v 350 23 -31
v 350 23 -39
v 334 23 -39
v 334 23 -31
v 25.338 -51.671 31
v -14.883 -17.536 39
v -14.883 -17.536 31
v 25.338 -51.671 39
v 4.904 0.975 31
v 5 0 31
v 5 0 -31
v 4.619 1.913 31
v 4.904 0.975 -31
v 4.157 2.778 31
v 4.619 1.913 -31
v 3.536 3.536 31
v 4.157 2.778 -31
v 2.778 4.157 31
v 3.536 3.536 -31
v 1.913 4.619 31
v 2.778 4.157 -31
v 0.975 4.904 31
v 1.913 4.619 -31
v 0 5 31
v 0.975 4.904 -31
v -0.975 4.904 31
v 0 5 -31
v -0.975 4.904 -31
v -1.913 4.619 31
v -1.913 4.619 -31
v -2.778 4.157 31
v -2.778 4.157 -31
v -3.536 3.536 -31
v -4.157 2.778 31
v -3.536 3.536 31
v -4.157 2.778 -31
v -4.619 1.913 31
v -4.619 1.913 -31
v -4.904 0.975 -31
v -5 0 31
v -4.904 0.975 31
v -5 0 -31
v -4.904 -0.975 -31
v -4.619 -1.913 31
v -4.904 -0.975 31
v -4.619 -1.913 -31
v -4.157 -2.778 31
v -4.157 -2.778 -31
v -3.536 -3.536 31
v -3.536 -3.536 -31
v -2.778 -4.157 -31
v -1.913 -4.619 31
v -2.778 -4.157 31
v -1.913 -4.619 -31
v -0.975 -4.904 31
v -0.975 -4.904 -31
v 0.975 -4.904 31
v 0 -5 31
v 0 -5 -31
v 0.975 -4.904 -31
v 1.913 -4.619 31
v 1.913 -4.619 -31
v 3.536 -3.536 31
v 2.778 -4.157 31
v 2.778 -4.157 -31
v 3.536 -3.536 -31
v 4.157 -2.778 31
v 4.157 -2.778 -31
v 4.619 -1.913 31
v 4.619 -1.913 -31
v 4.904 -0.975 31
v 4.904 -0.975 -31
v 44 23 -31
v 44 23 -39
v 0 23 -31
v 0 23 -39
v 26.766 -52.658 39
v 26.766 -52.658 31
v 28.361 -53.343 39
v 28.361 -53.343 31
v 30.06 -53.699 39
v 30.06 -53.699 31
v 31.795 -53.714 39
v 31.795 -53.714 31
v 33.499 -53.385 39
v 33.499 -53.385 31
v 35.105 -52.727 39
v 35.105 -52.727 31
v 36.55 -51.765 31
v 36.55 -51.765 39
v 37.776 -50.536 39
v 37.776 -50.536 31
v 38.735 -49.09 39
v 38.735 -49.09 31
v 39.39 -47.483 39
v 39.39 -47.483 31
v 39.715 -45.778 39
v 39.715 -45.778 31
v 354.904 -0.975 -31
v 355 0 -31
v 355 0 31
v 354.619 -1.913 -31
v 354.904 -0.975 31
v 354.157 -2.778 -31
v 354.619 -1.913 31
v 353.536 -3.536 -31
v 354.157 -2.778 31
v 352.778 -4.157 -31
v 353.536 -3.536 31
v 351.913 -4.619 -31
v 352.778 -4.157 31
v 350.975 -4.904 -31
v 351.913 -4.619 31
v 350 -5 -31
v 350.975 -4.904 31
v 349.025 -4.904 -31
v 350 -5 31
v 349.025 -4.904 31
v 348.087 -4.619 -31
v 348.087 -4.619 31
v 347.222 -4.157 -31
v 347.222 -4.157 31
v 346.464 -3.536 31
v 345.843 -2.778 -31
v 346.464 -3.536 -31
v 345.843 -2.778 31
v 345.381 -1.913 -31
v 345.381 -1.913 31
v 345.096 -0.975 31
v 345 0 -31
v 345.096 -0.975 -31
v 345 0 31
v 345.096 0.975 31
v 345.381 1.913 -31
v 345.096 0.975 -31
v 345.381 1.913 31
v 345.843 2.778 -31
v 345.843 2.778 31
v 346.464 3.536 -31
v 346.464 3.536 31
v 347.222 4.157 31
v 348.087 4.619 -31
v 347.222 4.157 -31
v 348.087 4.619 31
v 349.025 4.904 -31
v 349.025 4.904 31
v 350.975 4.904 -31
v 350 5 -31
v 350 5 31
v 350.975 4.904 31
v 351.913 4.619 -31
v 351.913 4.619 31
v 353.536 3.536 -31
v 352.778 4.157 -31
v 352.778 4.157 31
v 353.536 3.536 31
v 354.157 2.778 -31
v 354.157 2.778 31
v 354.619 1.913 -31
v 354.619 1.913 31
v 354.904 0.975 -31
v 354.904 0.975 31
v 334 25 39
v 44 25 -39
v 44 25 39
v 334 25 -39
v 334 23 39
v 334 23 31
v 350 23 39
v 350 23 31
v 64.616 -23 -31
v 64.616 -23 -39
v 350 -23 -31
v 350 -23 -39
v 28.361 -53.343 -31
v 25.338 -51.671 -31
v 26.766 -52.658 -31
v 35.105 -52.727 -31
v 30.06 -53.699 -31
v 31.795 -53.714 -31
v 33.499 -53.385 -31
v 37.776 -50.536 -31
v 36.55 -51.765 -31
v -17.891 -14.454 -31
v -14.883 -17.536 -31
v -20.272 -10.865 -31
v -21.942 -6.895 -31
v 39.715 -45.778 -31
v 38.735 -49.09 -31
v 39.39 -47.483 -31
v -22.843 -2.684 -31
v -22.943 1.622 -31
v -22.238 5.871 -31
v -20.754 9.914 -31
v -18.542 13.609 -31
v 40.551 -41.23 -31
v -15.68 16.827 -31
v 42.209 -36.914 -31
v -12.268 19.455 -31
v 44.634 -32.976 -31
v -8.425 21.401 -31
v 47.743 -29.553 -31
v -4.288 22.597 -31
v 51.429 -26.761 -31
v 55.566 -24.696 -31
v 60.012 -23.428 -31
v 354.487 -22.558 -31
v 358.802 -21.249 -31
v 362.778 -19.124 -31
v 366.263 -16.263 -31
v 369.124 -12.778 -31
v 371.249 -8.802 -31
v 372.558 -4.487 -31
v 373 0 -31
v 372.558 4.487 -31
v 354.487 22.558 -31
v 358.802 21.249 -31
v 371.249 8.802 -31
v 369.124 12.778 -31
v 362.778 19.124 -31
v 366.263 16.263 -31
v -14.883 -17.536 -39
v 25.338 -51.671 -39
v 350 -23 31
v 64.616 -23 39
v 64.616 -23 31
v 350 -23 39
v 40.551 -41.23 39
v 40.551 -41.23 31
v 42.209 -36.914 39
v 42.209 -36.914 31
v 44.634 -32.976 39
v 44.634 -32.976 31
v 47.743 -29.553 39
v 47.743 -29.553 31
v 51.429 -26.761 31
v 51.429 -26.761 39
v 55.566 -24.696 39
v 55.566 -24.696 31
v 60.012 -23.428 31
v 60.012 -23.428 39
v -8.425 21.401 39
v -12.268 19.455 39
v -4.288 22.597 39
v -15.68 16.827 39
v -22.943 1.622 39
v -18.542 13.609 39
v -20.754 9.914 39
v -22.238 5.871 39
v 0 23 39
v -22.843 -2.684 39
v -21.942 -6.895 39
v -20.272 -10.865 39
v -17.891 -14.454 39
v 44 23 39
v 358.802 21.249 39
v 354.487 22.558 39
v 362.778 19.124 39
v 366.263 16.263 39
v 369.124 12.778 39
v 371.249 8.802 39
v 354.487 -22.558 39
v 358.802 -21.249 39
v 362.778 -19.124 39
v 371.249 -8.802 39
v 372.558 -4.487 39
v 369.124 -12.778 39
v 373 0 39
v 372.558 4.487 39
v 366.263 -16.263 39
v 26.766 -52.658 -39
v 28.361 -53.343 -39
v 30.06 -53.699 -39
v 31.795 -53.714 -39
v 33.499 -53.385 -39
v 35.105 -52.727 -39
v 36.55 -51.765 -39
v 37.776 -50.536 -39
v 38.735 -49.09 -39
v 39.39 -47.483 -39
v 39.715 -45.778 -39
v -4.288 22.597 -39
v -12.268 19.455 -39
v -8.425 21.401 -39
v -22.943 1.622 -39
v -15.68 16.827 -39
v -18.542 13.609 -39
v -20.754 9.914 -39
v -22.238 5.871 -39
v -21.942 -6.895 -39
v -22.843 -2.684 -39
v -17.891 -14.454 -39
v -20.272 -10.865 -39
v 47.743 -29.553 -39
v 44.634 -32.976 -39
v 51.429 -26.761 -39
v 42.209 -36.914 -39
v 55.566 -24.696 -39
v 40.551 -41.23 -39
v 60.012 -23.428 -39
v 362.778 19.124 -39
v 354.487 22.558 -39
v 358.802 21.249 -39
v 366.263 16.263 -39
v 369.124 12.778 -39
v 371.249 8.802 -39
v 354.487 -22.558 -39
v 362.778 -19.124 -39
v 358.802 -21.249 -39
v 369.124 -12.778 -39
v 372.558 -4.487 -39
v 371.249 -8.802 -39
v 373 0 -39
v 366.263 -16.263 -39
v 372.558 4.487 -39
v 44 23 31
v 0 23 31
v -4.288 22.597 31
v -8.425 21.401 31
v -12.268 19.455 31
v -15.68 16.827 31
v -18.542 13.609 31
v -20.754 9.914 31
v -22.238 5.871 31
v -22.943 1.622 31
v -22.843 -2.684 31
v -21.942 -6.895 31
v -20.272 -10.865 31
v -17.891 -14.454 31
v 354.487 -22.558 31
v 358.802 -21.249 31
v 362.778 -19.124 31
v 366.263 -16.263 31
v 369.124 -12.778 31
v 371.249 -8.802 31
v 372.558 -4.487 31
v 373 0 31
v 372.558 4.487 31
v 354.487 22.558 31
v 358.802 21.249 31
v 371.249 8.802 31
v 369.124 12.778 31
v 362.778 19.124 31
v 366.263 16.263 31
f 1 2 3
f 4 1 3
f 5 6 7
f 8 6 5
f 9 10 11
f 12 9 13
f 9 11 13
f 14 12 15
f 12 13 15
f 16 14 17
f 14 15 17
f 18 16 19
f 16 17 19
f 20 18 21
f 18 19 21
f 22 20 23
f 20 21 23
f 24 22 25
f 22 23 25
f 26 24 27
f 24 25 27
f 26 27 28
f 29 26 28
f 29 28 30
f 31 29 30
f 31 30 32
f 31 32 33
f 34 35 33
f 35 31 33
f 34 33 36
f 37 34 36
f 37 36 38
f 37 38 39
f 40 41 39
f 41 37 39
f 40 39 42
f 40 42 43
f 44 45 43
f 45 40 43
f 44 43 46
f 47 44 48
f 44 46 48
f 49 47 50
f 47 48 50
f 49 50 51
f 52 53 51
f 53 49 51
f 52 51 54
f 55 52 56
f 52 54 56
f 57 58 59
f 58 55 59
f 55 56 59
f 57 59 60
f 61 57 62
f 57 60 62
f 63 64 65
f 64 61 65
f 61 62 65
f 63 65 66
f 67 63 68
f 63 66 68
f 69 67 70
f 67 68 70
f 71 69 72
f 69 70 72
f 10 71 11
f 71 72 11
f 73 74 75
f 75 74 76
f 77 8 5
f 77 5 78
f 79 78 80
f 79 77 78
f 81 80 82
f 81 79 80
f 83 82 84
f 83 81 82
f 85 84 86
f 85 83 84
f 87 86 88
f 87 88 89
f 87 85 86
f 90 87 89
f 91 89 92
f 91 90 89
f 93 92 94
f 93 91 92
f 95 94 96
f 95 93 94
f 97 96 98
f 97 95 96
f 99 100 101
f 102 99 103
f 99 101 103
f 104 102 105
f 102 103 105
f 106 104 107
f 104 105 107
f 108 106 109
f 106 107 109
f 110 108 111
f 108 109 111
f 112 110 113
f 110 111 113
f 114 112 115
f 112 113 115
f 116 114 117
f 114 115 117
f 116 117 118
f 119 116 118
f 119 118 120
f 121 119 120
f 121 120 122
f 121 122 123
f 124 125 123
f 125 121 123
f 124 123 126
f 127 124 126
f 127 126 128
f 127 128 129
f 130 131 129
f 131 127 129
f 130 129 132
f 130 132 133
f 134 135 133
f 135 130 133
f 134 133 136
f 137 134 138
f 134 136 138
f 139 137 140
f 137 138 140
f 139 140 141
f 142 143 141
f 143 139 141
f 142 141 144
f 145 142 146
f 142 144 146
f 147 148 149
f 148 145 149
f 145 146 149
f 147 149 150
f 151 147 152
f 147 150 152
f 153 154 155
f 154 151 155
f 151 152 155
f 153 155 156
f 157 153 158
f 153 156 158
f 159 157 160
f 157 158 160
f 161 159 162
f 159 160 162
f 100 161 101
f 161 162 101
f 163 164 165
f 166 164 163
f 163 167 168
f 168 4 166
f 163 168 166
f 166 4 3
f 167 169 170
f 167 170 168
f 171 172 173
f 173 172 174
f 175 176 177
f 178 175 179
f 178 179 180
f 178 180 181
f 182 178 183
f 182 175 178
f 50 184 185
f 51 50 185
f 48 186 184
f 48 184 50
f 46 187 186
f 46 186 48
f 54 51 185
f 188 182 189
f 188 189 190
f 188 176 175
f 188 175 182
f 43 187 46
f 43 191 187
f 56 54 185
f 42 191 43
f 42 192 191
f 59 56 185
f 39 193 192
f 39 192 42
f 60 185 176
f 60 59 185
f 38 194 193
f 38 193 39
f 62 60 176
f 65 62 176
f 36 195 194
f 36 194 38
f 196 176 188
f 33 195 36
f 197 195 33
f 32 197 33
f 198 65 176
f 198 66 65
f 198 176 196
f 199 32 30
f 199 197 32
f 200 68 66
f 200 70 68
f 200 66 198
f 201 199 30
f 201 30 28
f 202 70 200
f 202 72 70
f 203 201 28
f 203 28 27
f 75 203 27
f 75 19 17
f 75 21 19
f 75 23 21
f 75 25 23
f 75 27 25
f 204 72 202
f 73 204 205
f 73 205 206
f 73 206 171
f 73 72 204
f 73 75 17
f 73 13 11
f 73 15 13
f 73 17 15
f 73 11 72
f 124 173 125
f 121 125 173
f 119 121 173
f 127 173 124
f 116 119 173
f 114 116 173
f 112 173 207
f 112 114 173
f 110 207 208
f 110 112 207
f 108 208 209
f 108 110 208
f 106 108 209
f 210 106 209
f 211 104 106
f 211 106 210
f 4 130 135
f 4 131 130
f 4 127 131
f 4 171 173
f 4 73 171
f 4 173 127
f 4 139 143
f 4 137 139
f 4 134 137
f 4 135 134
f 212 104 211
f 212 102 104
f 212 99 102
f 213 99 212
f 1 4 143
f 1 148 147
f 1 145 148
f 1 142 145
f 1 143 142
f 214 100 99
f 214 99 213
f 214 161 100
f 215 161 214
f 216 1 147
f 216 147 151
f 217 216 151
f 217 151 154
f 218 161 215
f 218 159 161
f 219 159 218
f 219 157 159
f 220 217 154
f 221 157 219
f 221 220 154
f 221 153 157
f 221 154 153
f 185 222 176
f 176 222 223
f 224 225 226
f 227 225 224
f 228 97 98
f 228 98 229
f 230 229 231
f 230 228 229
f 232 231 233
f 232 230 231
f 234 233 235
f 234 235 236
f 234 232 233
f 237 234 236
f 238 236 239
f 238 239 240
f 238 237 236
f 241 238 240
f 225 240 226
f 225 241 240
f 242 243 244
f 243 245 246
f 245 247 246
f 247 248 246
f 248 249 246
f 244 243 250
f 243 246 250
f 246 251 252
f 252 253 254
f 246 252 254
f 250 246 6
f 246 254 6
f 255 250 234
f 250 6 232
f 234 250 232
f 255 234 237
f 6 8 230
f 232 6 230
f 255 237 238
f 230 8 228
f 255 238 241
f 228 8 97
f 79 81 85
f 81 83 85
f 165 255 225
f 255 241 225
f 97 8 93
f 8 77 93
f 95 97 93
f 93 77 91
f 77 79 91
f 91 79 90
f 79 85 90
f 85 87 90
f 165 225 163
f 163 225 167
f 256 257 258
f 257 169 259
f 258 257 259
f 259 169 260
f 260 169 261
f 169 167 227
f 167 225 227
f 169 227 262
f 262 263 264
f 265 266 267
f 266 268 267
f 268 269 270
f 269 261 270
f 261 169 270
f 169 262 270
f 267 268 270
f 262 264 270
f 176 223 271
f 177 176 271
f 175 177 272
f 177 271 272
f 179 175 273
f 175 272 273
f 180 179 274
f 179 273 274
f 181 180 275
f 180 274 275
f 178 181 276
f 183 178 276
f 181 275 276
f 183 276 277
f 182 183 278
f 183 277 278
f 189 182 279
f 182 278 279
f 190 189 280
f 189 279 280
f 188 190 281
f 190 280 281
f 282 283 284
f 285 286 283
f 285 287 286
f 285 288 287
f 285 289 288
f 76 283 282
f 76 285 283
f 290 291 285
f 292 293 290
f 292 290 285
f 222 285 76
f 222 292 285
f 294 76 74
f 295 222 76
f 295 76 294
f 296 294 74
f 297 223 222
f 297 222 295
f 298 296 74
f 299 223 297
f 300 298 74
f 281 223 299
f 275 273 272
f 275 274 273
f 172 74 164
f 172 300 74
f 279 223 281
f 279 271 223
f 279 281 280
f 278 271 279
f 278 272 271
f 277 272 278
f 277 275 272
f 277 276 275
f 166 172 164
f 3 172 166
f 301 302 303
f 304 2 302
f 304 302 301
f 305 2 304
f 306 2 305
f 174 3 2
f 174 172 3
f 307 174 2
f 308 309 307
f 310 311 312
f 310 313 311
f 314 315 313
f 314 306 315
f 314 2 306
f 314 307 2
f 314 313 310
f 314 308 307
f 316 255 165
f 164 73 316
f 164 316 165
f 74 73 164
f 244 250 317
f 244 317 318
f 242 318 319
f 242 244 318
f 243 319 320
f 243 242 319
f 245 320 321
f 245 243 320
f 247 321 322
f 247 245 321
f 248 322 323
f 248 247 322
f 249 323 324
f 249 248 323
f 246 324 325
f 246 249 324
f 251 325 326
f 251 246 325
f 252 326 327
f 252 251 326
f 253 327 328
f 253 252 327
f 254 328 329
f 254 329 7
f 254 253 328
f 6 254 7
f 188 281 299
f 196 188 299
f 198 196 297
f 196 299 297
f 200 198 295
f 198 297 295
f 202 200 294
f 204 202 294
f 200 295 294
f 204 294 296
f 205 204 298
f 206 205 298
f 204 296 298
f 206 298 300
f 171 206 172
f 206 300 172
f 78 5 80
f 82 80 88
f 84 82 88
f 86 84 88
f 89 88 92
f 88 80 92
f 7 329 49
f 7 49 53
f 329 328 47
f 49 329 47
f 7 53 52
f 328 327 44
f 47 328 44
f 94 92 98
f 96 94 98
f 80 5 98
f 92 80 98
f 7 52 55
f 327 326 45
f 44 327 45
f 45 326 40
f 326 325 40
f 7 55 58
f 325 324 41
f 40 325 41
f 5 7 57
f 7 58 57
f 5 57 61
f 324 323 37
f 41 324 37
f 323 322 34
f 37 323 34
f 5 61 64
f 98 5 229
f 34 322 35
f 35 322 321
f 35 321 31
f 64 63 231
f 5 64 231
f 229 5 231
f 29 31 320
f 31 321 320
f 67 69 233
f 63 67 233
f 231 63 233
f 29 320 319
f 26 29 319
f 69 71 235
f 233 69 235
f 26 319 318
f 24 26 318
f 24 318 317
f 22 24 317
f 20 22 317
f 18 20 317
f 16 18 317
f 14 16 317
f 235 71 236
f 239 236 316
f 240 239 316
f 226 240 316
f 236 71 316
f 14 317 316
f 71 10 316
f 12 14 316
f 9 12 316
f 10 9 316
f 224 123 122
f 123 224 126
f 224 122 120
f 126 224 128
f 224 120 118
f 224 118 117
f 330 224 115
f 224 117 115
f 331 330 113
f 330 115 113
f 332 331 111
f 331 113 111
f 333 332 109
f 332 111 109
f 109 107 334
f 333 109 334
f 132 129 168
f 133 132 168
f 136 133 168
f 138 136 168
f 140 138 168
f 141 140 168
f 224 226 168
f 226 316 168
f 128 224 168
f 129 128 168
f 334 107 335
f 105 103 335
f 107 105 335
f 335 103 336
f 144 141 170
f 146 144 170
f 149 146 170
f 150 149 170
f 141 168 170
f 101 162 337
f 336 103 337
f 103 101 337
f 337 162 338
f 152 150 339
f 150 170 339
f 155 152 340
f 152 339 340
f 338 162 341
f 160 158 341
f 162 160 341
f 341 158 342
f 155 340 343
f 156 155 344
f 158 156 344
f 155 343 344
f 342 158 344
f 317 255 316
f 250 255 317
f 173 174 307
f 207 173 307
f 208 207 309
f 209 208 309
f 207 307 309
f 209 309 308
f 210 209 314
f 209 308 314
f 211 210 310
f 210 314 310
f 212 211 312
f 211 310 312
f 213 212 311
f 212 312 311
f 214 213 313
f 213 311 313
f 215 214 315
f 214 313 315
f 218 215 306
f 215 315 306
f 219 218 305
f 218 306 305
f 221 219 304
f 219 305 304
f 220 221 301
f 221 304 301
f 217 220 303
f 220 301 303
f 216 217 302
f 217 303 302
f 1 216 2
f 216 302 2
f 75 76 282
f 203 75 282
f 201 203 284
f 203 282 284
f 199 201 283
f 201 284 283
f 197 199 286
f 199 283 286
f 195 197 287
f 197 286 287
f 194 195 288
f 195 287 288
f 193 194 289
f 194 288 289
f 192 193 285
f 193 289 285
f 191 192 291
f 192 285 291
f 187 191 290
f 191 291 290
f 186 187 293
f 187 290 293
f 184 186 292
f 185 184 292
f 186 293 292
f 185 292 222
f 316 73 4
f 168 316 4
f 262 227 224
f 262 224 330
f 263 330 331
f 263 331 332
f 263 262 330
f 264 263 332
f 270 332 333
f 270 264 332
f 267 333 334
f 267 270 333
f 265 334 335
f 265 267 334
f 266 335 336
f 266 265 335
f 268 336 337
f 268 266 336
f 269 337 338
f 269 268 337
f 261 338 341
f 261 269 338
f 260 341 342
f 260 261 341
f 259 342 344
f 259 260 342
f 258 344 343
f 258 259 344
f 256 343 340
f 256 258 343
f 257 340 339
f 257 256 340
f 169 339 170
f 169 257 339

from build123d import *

# Parameters (mm, degrees)
SALIENTE_EXTRUIR1_DEPTH = 8
SALIENTE_EXTRUIR2_DEPTH = 8
CROQUIS3_W              = 290
CROQUIS3_H              = 78
SALIENTE_EXTRUIR3_DEPTH = 2
SALIENTE_EXTRUIR4_REACH = 385.299
CROQUIS4_R              = 5
SALIENTE_EXTRUIR5_REACH = 385.299
CROQUIS5_R              = 5


with BuildPart() as part:
    # Croquis1 → Saliente-Extruir1 (new body)
    with BuildSketch(Plane.XY.offset(39)):
        with BuildLine():
            Line((-14.882678763, -17.53584537), (25.33811134, -51.671245521))
            ThreePointArc((25.33811134, -51.671245521), (34.318759969, -53.096192455), (39.715363545, -45.777777778))
            ThreePointArc((39.715363545, -45.777777778), (47.742688304, -29.553380316), (64.616402247, -23))
            Line((64.616402247, -23), (350, -23))
            ThreePointArc((350, -23), (373, 0), (350, 23))
            Line((350, 23), (0, 23))
            ThreePointArc((0, 23), (-21.590790207, 7.927028336), (-14.882678763, -17.53584537))
        make_face()
    extrude(amount=-SALIENTE_EXTRUIR1_DEPTH)



with BuildPart() as body_2:
    # Croquis2 → Saliente-Extruir2 (new body)
    with BuildSketch(Plane.XY.offset(-39)):
        with BuildLine():
            Line((-14.882678763, -17.53584537), (25.33811134, -51.671245521))
            ThreePointArc((25.33811134, -51.671245521), (34.318759969, -53.096192455), (39.715363545, -45.777777778))
            ThreePointArc((39.715363545, -45.777777778), (47.742688304, -29.553380316), (64.616402247, -23))
            Line((64.616402247, -23), (350, -23))
            ThreePointArc((350, -23), (373, 0), (350, 23))
            Line((350, 23), (0, 23))
            ThreePointArc((0, 23), (-21.590790207, 7.927028336), (-14.882678763, -17.53584537))
        make_face()
    extrude(amount=SALIENTE_EXTRUIR2_DEPTH)


with BuildPart() as part_1:
    add(part.part)

    add(body_2.part)  # Saliente-Extruir3 merges body 2
    # Croquis3 → Saliente-Extruir3 (add)
    with BuildSketch(Plane(origin=(0, 23, 0), x_dir=(1, 0, 0), z_dir=(0, 1, 0))):
        with Locations((189, 0)):
            Rectangle(CROQUIS3_W, CROQUIS3_H)
    extrude(amount=SALIENTE_EXTRUIR3_DEPTH)

    # Croquis4 → Saliente-Extruir4 (add, up to next)
    with BuildSketch(Plane.XY.offset(-31), mode=Mode.PRIVATE) as saliente_extruir4_sk1:
        Circle(CROQUIS4_R)
    saliente_extruir4_tool1 = extrude(saliente_extruir4_sk1.sketch, amount=SALIENTE_EXTRUIR4_REACH, mode=Mode.PRIVATE) - part_1.part
    add(saliente_extruir4_tool1.solids().sort_by_distance((0, 0, -31))[0])

    # Croquis5 → Saliente-Extruir5 (add, up to next)
    with BuildSketch(Plane(origin=(0, 0, 31), x_dir=(-1, 0, 0), z_dir=(0, 0, -1)), mode=Mode.PRIVATE) as saliente_extruir5_sk1:
        with Locations(Location((-350, 0, 0), (0, 0, 180))):
            Circle(CROQUIS5_R)
    saliente_extruir5_tool1 = extrude(saliente_extruir5_sk1.sketch, amount=SALIENTE_EXTRUIR5_REACH, mode=Mode.PRIVATE) - part_1.part
    add(saliente_extruir5_tool1.solids().sort_by_distance((350, 0, 31))[0])


solid = part_1.part
